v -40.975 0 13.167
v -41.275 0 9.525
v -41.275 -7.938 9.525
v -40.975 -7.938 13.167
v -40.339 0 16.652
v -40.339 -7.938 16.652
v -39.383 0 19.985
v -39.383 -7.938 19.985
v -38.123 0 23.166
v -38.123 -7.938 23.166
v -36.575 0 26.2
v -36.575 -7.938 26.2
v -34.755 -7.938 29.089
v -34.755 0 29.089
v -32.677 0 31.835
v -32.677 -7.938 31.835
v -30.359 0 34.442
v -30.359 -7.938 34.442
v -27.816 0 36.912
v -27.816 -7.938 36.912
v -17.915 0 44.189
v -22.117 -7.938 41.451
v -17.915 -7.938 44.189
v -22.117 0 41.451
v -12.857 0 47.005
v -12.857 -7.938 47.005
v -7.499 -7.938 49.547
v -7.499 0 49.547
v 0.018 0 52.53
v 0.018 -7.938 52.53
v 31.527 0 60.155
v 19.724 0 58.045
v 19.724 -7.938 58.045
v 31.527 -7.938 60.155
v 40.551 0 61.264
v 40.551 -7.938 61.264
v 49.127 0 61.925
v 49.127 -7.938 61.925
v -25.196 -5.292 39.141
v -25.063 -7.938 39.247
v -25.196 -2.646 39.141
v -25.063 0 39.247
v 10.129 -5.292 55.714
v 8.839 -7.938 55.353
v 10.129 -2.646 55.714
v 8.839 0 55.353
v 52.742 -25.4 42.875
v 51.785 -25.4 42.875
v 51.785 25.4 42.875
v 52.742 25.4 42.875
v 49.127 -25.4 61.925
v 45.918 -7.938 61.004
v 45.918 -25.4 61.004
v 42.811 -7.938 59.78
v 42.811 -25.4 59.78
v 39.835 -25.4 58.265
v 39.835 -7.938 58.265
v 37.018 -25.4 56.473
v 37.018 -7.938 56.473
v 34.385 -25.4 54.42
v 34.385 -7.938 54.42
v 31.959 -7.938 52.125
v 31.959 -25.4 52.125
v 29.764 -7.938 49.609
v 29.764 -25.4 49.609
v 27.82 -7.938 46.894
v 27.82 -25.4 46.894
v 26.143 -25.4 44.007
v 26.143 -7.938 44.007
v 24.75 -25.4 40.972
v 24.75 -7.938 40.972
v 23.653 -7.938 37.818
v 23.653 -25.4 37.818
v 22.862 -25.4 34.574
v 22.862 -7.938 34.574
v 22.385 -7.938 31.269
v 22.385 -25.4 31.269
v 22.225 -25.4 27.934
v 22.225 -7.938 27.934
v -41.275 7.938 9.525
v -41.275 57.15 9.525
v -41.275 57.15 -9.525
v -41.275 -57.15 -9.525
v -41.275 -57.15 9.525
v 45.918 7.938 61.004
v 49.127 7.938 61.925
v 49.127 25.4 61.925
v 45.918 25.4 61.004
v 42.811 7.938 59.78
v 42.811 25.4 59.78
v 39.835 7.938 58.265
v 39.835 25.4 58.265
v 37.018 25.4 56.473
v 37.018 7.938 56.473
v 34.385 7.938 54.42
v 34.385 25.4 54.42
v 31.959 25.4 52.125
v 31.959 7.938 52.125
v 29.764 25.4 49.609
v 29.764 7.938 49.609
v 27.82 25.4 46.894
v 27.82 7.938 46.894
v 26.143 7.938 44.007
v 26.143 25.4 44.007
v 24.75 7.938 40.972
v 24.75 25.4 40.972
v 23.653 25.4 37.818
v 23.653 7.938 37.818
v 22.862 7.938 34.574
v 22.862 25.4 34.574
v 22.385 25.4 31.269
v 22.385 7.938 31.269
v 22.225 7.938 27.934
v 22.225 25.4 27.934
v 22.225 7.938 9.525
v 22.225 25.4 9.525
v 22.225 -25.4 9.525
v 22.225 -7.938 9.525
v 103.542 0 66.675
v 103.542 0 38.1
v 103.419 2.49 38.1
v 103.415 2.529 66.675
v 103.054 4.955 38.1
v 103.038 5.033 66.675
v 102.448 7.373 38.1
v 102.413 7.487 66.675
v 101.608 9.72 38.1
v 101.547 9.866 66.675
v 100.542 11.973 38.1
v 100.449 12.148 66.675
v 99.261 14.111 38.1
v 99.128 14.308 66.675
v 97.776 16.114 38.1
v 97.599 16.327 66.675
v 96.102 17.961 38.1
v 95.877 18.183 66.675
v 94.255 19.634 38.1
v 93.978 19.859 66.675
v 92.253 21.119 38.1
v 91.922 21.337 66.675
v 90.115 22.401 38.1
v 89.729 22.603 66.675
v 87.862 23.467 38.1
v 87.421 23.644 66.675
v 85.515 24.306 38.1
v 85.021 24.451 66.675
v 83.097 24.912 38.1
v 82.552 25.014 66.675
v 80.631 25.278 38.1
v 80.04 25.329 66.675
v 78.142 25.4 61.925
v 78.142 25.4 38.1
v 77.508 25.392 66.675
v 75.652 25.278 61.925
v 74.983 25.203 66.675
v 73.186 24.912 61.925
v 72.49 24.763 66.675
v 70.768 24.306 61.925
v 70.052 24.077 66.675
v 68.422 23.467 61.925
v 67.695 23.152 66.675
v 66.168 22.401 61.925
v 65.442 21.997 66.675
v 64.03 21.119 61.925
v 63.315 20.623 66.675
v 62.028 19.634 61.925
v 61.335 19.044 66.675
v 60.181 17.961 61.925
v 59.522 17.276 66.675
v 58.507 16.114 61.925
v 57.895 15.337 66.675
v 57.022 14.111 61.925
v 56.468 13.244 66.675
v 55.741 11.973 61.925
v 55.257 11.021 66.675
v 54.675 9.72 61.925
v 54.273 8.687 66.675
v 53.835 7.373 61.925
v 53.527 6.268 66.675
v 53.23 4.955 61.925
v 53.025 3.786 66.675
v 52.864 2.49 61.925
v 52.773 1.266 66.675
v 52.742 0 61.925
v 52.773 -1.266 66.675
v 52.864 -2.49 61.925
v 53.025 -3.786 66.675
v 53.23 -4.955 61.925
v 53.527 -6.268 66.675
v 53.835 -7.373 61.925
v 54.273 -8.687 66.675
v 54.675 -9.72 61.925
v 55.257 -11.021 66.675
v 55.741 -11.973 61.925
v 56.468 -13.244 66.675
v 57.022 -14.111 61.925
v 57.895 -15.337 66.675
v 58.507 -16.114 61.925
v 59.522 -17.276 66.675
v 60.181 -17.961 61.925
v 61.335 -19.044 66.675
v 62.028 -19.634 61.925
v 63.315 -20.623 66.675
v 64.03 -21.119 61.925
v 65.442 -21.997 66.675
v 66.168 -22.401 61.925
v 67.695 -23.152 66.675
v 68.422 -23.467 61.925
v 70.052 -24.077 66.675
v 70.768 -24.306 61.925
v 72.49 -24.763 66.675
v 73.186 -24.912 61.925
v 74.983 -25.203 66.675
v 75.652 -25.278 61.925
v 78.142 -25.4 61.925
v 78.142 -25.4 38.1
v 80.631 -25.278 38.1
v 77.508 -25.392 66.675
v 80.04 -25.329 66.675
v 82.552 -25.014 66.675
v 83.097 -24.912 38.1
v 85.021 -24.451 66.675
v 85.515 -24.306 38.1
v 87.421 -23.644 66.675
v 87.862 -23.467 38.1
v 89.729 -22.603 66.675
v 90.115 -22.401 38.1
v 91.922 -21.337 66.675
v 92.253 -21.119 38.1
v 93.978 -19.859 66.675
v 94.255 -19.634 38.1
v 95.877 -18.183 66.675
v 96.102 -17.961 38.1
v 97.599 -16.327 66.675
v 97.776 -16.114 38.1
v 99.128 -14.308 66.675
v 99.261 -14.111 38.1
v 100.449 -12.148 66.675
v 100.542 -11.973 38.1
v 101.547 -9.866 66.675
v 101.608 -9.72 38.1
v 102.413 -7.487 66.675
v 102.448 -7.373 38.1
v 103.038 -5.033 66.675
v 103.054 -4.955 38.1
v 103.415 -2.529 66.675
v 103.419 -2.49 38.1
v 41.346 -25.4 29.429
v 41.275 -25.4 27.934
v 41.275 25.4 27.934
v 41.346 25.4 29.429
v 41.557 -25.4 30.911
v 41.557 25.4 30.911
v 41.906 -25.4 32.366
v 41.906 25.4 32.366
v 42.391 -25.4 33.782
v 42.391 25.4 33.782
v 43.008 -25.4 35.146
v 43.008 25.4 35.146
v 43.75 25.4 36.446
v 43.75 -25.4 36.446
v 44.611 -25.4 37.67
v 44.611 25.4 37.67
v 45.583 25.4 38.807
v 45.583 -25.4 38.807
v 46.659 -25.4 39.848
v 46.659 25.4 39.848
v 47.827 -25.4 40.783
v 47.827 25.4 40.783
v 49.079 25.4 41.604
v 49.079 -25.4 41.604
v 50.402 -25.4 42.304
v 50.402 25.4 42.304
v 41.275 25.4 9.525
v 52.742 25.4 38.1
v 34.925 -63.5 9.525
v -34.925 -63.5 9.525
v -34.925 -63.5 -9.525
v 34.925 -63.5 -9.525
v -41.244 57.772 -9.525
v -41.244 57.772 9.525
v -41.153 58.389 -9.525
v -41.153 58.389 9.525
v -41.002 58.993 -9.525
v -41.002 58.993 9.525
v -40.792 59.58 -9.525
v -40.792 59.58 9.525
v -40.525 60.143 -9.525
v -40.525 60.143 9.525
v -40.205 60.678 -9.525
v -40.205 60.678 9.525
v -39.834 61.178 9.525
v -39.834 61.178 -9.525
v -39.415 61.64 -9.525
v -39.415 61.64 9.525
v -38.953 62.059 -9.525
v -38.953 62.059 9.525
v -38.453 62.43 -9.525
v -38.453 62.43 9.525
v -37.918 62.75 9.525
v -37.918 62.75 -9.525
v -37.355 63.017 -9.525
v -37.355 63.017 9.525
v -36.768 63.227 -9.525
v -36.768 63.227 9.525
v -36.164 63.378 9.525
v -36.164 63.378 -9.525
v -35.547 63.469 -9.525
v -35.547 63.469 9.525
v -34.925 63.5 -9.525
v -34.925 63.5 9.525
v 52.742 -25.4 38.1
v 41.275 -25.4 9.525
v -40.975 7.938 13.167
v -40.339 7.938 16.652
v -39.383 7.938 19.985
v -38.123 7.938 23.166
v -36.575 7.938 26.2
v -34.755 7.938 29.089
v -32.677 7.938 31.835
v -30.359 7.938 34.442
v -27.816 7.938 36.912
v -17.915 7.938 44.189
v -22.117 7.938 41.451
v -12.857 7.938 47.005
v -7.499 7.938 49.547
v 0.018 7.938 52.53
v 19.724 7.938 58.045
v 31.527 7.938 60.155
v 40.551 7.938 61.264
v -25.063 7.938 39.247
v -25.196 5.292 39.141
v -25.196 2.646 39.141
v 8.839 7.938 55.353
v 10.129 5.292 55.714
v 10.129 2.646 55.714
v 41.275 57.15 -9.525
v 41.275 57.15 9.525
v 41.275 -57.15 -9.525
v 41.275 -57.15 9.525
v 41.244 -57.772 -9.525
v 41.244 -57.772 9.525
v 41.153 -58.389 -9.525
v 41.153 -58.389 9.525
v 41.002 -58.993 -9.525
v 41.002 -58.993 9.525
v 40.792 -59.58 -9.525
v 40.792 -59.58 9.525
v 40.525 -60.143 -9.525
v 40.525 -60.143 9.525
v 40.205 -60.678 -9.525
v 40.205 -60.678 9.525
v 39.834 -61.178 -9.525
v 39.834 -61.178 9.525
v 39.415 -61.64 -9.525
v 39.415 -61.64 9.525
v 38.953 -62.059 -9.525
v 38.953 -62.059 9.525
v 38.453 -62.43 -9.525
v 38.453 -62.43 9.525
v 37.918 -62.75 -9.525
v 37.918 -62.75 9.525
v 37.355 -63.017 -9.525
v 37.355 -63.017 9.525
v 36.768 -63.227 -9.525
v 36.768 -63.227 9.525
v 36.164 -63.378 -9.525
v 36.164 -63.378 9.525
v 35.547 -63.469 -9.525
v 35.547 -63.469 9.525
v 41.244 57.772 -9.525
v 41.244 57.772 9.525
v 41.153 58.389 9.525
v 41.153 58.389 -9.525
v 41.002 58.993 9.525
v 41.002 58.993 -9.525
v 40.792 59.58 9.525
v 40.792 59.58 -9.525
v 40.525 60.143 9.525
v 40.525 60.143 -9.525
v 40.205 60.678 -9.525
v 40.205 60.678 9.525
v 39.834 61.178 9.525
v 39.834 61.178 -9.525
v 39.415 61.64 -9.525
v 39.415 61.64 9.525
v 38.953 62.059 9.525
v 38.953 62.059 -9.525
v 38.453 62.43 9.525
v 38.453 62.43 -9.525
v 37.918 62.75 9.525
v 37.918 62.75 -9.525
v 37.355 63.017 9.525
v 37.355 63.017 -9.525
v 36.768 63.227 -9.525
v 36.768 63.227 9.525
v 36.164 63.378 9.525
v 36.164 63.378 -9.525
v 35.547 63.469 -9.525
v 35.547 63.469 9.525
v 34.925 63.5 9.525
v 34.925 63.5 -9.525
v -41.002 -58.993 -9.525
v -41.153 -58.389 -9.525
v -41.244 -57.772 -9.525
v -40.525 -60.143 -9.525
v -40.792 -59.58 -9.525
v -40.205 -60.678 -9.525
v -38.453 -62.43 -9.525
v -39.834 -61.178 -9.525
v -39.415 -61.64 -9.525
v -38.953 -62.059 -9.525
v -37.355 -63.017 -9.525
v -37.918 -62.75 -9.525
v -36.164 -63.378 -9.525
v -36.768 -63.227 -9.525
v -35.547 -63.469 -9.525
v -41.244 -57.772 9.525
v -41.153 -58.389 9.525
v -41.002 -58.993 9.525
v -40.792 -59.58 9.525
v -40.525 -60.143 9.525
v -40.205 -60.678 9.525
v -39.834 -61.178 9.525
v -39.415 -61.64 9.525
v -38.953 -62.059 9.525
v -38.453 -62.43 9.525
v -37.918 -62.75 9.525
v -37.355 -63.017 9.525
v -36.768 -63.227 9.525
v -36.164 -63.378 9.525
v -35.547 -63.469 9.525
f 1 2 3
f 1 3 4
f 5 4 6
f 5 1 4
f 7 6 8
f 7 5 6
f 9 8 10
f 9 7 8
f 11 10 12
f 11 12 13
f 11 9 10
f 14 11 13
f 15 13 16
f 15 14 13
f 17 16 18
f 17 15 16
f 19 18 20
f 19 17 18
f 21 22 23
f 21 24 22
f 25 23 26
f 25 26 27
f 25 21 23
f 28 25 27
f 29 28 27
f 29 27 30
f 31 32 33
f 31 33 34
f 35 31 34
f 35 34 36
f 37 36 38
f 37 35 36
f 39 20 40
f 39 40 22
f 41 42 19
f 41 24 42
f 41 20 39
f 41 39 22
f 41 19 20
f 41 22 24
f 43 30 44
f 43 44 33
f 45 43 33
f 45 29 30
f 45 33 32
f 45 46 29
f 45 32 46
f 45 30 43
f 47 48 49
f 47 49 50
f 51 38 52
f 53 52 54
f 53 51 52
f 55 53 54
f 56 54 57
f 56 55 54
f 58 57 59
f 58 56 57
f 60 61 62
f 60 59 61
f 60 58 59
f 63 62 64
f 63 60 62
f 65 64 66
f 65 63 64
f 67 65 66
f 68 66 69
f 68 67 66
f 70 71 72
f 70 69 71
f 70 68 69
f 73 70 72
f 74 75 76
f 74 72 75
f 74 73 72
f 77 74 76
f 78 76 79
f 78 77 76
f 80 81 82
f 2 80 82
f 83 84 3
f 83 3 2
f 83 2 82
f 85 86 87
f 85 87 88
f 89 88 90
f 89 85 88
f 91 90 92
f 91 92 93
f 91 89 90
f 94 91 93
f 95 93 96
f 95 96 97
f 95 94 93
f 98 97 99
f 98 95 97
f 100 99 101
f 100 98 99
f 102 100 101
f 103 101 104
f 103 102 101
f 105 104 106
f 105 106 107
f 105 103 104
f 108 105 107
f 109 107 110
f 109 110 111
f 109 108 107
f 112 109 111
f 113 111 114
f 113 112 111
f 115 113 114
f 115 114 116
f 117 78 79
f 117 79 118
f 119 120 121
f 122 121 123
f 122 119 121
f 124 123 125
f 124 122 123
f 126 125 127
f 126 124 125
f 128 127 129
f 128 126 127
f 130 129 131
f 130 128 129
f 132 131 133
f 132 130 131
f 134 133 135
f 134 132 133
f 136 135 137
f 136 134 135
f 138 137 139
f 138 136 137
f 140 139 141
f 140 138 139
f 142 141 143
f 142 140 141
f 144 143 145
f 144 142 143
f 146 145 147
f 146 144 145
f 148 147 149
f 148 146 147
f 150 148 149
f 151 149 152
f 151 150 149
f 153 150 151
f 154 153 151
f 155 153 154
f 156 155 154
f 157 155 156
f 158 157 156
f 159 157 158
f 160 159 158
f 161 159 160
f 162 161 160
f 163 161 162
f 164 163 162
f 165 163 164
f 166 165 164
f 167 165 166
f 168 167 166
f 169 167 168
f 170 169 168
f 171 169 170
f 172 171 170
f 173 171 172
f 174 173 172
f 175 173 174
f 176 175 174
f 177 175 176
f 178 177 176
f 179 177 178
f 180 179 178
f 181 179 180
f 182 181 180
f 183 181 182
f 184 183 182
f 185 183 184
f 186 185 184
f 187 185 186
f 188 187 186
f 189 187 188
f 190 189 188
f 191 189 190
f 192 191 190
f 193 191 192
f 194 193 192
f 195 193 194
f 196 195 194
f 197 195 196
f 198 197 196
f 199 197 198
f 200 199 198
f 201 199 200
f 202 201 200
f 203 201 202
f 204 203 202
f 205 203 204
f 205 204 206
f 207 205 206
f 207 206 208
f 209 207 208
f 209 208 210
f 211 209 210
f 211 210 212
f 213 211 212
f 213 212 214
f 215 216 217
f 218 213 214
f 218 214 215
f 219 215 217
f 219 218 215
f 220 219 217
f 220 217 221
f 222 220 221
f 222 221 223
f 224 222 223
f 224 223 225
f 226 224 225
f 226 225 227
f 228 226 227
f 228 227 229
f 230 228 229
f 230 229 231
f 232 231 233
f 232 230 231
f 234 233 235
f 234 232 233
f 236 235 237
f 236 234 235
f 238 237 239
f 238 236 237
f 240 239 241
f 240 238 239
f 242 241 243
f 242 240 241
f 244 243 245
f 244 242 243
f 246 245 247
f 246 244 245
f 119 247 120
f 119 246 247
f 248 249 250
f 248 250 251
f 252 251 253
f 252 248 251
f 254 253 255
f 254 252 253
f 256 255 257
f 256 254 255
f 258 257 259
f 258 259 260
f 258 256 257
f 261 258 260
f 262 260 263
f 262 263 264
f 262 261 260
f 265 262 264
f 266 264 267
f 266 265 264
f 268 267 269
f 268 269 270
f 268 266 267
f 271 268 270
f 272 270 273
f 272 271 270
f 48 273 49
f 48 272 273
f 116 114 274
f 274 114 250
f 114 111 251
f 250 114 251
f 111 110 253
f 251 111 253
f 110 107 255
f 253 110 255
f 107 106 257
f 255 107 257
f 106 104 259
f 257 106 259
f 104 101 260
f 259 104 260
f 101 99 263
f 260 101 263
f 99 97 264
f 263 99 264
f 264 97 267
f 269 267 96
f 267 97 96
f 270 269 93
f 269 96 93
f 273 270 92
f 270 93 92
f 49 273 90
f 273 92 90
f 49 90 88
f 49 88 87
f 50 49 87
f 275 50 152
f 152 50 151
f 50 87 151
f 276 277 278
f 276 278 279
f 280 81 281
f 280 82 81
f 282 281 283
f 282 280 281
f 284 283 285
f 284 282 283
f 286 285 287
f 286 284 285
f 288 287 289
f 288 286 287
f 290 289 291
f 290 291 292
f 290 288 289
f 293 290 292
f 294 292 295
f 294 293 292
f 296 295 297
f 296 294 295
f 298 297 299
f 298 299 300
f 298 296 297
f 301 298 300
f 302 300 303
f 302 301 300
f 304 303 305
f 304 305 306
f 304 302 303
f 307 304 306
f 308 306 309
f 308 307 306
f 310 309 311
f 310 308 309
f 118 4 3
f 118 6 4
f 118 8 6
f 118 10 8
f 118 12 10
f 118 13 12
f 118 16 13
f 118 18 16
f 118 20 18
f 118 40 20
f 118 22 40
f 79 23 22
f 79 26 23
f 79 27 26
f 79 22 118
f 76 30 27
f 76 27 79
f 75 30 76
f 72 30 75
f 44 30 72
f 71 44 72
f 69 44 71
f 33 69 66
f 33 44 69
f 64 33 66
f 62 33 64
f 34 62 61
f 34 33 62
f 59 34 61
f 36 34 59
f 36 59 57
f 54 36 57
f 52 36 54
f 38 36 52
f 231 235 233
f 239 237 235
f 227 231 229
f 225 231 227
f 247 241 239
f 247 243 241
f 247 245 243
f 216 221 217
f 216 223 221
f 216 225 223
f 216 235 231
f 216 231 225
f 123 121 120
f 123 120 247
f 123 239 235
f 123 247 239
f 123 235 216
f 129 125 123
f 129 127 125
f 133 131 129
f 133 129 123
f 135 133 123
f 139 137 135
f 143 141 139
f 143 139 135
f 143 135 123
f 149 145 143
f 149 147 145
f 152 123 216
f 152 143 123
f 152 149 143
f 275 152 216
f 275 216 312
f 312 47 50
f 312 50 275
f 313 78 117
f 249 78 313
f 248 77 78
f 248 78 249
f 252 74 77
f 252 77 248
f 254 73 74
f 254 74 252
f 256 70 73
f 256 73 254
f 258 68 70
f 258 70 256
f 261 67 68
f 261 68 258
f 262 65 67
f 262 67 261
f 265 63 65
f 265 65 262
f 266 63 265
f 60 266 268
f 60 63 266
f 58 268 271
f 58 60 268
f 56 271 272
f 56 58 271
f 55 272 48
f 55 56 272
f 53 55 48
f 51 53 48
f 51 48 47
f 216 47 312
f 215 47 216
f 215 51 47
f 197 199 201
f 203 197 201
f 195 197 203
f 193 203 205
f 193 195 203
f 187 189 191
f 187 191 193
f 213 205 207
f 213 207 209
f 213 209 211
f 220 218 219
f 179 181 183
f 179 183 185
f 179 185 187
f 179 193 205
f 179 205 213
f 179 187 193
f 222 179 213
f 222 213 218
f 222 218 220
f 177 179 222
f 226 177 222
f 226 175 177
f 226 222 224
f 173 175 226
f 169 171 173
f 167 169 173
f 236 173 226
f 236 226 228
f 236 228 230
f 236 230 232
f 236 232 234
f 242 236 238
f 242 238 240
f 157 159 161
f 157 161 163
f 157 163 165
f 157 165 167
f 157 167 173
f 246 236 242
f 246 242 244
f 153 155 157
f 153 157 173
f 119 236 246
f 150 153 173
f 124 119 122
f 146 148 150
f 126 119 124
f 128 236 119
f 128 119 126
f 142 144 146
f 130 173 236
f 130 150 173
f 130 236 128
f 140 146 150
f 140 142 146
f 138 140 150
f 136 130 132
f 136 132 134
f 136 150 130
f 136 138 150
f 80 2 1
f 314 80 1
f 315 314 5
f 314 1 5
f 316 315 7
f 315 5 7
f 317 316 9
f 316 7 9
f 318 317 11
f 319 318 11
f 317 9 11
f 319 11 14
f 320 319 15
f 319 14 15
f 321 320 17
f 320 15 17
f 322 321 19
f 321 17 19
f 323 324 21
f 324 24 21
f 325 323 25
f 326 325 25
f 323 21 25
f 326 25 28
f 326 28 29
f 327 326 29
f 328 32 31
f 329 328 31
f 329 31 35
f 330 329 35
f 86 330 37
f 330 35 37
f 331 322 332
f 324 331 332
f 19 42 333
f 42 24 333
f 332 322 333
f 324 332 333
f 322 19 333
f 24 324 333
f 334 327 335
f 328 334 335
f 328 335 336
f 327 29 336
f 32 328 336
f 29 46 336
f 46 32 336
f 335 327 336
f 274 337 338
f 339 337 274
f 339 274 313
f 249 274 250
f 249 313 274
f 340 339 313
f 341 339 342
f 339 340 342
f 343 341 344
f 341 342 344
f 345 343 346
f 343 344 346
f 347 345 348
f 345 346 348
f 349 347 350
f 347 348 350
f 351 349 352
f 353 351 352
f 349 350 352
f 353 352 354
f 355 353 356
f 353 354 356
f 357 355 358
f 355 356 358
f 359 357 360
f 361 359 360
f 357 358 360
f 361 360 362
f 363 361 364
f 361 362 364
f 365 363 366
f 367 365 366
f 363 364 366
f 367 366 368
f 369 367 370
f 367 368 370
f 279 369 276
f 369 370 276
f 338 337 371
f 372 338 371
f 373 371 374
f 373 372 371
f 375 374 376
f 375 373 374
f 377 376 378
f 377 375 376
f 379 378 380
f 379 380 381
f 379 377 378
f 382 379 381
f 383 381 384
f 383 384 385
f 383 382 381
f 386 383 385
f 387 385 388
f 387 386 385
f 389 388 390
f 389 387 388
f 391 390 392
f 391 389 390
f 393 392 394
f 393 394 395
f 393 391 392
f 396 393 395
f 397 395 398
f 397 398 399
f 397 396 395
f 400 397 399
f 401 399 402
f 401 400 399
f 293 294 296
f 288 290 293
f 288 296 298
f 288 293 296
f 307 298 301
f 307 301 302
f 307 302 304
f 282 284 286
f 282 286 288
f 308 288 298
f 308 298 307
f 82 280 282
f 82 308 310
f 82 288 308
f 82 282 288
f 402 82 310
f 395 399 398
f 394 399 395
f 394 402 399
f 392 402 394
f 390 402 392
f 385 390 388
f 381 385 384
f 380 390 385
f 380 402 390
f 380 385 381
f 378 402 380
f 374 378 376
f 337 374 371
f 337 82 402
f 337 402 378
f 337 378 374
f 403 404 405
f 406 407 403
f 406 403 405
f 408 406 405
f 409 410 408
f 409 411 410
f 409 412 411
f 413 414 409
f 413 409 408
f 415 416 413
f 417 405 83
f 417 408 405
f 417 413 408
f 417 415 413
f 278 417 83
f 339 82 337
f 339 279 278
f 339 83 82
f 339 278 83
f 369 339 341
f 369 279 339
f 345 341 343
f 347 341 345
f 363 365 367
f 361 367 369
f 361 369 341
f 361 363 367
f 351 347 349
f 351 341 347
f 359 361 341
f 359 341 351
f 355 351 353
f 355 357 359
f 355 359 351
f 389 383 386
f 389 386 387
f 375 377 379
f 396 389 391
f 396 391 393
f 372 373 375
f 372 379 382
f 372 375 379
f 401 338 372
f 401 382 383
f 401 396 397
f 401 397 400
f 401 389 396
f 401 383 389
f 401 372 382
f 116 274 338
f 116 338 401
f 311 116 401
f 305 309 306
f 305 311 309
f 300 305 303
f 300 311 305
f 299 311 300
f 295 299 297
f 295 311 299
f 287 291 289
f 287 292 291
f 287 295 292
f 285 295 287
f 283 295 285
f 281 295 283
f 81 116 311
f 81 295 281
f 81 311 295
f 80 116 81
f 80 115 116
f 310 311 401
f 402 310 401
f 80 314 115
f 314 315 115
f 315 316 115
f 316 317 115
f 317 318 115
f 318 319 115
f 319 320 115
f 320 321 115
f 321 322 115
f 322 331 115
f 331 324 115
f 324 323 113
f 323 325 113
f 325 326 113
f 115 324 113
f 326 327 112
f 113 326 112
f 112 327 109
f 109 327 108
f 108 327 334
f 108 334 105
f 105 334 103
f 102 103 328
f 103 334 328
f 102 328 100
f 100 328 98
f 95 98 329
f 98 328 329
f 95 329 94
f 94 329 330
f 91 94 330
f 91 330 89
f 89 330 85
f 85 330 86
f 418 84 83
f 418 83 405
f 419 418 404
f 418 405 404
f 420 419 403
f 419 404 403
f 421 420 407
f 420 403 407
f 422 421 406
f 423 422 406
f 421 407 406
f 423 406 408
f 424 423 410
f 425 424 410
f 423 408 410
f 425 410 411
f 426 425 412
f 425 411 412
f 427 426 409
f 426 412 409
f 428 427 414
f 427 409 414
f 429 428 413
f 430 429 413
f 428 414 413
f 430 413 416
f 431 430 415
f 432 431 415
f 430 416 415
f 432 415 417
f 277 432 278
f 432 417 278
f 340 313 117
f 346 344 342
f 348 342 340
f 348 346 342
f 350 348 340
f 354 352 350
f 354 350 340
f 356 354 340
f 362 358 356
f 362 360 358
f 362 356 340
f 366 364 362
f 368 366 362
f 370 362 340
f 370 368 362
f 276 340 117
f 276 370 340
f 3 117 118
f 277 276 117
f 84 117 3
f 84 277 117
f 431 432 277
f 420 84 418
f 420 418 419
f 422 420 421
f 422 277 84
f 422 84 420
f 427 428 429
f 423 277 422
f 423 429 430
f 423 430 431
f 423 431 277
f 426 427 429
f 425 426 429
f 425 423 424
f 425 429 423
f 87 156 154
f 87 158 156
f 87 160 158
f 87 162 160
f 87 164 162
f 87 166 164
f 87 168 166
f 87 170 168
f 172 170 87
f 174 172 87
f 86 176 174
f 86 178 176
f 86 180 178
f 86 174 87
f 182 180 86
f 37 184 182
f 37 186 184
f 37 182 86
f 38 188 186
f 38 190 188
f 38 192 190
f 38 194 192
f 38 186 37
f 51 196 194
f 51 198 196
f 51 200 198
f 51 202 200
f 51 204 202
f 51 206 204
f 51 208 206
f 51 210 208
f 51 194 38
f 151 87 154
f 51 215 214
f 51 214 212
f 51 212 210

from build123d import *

# Parameters (mm, degrees)
F1_DEPTH = 63.5
F2_DEPTH = 25.4
F3_DEPTH = 7.9375
F4_DEPTH = 25.4
F6_R     = 6.35


with BuildPart() as f1:
    # F0 (on Front) → F1 (new body, symmetric)
    with BuildSketch(Plane.XZ):
        Polygon((41.275, -9.525), (41.275, 9.525), (22.225, 9.525), (-41.275, 9.525), (-41.275, -9.525), align=None)
    extrude(amount=F1_DEPTH, both=True)

    # F0 (on Front) → F2 (join, symmetric)
    with BuildSketch(Plane.XZ):
        with BuildLine():
            Line((22.225, 9.525), (41.275, 9.525))
            Line((41.275, 9.525), (41.275, 27.934134))
            ThreePointArc((41.275, 27.934134), (44.165769, 37.067884), (51.785284, 42.8752))
            Line((51.785284, 42.8752), (52.741684, 42.8752))
            Line((52.741684, 42.8752), (52.741684, 61.9252))
            Line((52.741684, 61.9252), (49.12734, 61.9252))
            ThreePointArc((49.12734, 61.9252), (29.764356, 49.608592), (22.225, 27.934134))
            Line((22.225, 27.934134), (22.225, 9.525))
        make_face()
    extrude(amount=F2_DEPTH, both=True)

    # F0 (on Front) → F3 (join, symmetric)
    with BuildSketch(Plane.XZ):
        with BuildLine():
            Line((-41.275, 9.525), (22.225, 9.525))
            Line((22.225, 9.525), (22.225, 27.934134))
            ThreePointArc((22.225, 27.934134), (29.764356, 49.608592), (49.12734, 61.9252))
            add(Edge.make_bspline(
                [(-41.275, 9.525), (-40.009573, 46.556816), (13.483403, 60.000081), (49.12734, 61.9252)],
                knots=[0, 0, 0, 0, 104.490976, 104.490976, 104.490976, 104.490976], degree=3))
        make_face()
    extrude(amount=F3_DEPTH, both=True)

    # F0 (on Front) → F4 (join, symmetric)
    with BuildSketch(Plane.XZ):
        Polygon((52.741684, 61.9252), (52.741684, 42.8752), (52.741684, 38.1), (78.141684, 38.1), (78.141684, 61.9252), align=None)
    extrude(amount=F4_DEPTH, both=True)

    # F0 (on Front) → F5 (revolve)
    with BuildSketch(Plane.XZ):
        Polygon((78.141684, 66.675), (78.141684, 61.9252), (78.141684, 38.1), (103.541684, 38.1), (103.541684, 66.675), align=None)
    revolve(axis=Axis((78.141684, 0, 52.3875), (0, 0, 1)))

    # F6
    f6_edges = [f1.edges().sort_by_distance(p)[0] for p in [
        (41.275, -63.5, 0),
        (-41.275, -63.5, 0),
        (-41.275, 63.5, 0),
        (41.275, 63.5, 0),
    ]]
    fillet(f6_edges, radius=F6_R)


solid = f1.part
